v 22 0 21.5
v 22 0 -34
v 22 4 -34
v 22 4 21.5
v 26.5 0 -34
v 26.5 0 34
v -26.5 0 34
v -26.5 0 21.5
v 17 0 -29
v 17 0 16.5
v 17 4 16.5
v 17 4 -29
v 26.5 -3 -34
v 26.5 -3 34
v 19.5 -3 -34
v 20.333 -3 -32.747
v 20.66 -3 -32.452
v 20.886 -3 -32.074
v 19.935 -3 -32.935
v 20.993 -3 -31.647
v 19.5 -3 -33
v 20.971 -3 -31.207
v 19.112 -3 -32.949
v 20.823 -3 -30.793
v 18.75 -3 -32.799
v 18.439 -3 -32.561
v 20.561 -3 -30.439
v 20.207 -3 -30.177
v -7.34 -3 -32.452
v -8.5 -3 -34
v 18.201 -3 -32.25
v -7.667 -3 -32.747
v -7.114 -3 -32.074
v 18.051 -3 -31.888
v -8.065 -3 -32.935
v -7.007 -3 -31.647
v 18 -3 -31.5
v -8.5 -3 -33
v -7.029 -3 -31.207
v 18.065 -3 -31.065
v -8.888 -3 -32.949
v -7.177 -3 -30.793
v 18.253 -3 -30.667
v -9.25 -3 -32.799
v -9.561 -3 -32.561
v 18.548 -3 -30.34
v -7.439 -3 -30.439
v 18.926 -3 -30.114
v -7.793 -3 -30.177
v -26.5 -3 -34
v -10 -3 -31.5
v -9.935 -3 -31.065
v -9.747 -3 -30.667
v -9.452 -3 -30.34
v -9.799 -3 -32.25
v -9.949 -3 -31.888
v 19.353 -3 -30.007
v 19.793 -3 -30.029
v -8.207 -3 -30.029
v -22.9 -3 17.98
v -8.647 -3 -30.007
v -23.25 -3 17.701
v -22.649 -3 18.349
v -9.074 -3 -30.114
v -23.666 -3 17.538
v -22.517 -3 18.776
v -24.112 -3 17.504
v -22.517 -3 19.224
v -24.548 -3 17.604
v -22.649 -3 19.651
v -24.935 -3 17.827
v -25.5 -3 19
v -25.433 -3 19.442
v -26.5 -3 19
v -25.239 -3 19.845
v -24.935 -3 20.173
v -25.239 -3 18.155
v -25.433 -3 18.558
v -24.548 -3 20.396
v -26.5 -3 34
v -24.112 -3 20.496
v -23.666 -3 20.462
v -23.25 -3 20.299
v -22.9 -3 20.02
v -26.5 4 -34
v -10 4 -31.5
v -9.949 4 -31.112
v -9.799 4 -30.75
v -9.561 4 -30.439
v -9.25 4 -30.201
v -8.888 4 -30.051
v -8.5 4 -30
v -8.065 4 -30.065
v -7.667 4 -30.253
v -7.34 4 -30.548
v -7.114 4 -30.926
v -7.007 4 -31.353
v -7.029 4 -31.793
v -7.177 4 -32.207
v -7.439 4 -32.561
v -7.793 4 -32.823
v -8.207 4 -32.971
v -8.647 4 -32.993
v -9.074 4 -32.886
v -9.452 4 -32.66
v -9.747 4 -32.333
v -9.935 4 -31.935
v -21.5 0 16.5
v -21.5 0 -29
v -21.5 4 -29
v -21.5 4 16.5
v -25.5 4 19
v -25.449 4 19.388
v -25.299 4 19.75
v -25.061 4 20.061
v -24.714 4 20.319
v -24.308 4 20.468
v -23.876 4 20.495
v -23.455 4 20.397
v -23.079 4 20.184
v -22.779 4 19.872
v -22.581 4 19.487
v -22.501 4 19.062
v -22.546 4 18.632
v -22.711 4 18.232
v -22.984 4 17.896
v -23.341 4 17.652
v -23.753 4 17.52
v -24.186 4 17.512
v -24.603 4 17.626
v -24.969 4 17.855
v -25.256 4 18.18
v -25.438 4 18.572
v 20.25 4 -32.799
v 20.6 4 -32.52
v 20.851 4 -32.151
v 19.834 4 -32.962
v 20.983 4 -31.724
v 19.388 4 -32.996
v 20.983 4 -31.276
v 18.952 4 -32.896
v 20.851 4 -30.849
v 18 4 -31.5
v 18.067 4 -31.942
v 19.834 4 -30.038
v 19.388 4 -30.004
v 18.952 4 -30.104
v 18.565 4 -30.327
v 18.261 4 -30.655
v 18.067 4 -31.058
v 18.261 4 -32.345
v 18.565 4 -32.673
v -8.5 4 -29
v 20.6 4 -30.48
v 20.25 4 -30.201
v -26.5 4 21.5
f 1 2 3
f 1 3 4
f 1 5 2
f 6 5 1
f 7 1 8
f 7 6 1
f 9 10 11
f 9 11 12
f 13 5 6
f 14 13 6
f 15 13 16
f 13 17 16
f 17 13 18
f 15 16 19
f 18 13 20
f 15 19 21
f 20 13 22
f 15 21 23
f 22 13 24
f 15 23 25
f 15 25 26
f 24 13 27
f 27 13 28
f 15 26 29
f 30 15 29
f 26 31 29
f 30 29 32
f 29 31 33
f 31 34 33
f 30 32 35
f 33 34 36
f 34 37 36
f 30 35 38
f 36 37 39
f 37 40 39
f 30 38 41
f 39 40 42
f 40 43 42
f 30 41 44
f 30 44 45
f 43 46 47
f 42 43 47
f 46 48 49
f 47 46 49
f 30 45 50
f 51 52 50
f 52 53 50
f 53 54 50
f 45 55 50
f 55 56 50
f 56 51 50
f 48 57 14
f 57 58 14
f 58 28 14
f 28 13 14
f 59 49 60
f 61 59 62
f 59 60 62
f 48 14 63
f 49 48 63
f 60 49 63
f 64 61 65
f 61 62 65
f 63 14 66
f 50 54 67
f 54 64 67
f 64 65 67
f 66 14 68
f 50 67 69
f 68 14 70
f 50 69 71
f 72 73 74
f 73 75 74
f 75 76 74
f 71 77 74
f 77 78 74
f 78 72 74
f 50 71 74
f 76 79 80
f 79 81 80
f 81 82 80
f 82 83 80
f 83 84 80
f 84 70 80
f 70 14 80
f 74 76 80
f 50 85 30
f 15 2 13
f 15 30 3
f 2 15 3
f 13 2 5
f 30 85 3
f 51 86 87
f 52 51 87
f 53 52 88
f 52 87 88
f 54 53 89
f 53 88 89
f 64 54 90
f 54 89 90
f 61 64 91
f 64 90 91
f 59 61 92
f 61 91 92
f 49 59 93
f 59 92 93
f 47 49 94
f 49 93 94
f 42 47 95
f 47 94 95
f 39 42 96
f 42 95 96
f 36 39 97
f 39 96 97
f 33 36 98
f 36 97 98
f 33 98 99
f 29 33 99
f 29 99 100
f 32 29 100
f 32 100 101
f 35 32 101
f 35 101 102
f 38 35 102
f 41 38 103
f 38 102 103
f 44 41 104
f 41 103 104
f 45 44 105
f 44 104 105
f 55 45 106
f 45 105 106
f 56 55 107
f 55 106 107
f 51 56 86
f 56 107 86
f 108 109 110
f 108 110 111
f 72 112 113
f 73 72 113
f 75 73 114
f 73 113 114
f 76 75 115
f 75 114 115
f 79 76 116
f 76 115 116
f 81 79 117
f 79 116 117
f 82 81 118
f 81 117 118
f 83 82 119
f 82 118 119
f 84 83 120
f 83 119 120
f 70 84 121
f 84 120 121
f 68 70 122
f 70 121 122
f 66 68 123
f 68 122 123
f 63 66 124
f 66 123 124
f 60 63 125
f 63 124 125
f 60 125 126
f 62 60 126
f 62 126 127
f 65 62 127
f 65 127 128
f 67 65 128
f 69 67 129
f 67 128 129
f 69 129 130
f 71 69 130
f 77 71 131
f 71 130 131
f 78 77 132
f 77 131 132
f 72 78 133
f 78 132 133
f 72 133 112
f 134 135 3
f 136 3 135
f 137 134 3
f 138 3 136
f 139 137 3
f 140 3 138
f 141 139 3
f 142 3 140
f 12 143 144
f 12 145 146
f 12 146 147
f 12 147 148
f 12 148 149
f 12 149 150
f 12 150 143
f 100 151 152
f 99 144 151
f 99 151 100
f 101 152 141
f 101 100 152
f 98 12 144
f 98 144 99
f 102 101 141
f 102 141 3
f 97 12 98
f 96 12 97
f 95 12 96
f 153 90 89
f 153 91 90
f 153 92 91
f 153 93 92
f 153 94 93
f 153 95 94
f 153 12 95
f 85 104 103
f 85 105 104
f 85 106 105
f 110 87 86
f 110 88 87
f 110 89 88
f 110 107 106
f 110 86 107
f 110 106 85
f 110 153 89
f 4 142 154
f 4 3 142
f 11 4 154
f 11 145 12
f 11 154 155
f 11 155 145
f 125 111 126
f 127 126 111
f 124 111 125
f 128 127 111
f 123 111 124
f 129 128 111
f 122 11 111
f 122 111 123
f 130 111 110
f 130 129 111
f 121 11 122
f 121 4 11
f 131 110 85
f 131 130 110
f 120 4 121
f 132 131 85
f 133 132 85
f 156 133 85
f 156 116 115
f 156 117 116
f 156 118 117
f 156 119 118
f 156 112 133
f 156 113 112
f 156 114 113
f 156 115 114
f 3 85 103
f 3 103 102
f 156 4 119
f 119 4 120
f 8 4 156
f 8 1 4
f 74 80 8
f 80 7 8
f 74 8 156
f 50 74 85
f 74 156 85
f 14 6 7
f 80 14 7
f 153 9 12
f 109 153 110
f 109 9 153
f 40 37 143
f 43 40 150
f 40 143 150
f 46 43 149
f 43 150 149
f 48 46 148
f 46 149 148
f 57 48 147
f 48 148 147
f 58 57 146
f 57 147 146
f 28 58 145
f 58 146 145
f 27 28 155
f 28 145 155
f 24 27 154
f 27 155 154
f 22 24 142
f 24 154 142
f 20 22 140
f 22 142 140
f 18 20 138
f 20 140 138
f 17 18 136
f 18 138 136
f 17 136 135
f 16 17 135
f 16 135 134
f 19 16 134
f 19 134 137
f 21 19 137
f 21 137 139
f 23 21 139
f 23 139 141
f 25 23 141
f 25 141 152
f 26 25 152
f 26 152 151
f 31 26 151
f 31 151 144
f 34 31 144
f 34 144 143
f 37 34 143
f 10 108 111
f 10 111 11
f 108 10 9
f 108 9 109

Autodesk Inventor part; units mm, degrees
ref_plane "YZ Plane" through (0, 0, 0) normal (1, 0, 0) x (0, 1, 0)
ref_plane "XZ Plane" through (0, 0, 0) normal (0, 1, 0) x (-1, 0, 0)
ref_plane "XY Plane" through (0, 0, 0) normal (0, 0, 1) x (1, 0, 0)
sketch "Sketch1" plane through (0, 0, 0) normal (0, 1, 0) x (-1, 0, 0)
  line L0 (-26.5, 34) -> (26.5, 34)
  line L1 (26.5, 34) -> (26.5, -34)
  line L2 (26.5, -34) -> (-26.5, -34)
  line L3 (-26.5, -34) -> (-26.5, 34)
  line L4 (-26.5, 34) -> (26.5, -34) construction
  line L5 (26.5, 34) -> (-26.5, -34) construction
  line L6 (26.5, 34) -> (26.5, 19)
  line L7 (-26.5, -34) -> (-19.5, -34)
  line L8 (-26.5, -34) -> (8.5, -34)
  circle A0 centre (8.5, -31.5) radius 1.5
  circle A1 centre (-19.5, -31.5) radius 1.5
  line L9 (-19.5, -33) -> (-19.5, -34)
  line L10 (8.5, -33) -> (8.5, -34)
  circle A2 centre (-19.5, -31.5) radius 1.5
  circle A3 centre (24, 19) radius 1.5
  line L11 (25.5, 19) -> (26.5, 19)
  line L12 (26.5, 19) -> (25.5, 19)
  point P0 (0, 0)
  dimension "d6" = 3
  dimension "d7" = 3
  dimension "d9" = 3
  dimension "d0" = 53
  dimension "d1" = 68
  dimension "d2" = 15
  dimension "d3" = 7
  dimension "d4" = 35
  dimension "d12" = 1
  dimension "d13" = 1
sketch "Sketch2" plane through (0, 0, 0) normal (0, 1, 0) x (-1, 0, 0)
  line L0 (0, 0) -> (0, 34)
  line L1 (0, 34) -> (0, 21.5)
  line L2 (0, 21.5) -> (26.5, 21.5)
  line L3 (26.5, 21.5) -> (26.5, -34)
  line L4 (26.5, -34) -> (-22, -34)
  line L5 (-22, -34) -> (-22, 21.5)
  line L6 (-22, 21.5) -> (0, 21.5)
  line L7 (26.5, 21.5) -> (26.5, 16.5)
  line L8 (21.5, 16.5) -> (-22, 16.5)
  line L9 (-22, 16.5) -> (-17, 16.5)
  line L10 (-22, 21.5) -> (-17, 21.5)
  line L11 (-17, 16.5) -> (-17, -29)
  line L12 (-22, -34) -> (-22, -29)
  line L13 (-17, -29) -> (21.5, -29)
  line L14 (26.5, -34) -> (21.5, -34)
  line L15 (21.5, -29) -> (21.5, 16.5)
  circle A0 centre (24, 19) radius 1.5
  line L16 (21.5, -29) -> (8.5, -29)
  line L17 (8.5, -29) -> (8.5, -31.5)
  circle A1 centre (8.5, -31.5) radius 1.5
  circle A2 centre (-19.5, -31.5) radius 1.5
  circle A3 centre (8.5, -31.5) radius 1.5
  line L18 (26.5, 21.5) -> (25.0607, 20.0607)
  line L19 (-17, -29) -> (-18.4393, -30.4393)
  line L20 (-20.5607, -32.5607) -> (-22, -34)
  point P0 (-17, -6.25)
  dimension "d25" = 3
  dimension "d14" = 34
  dimension "d15" = 12.5
  dimension "d16" = 26.5
  dimension "d17" = 55.5
  dimension "d18" = 48.5
  dimension "d19" = 55.5
  dimension "d20" = 5
  dimension "d21" = 48.5
  dimension "d23" = 5
  dimension "d24" = 5
  dimension "d26" = 13
  dimension "d27" = 3
  dimension "d28" = 3
  dimension "d29" = 3
extrude "Extrusion1" add sketch "Sketch2" along normal blind 4 contours L8 L5 L6 L0 | L0 L2 L3 L4 L20 A2 L19 L13 L15 L8 | L11 L19 A2 L20 L5 L8
extrude "Extrusion2" add sketch "Sketch1" against normal blind 3
properties part number "Arduino_Screw_Hole_Base"
